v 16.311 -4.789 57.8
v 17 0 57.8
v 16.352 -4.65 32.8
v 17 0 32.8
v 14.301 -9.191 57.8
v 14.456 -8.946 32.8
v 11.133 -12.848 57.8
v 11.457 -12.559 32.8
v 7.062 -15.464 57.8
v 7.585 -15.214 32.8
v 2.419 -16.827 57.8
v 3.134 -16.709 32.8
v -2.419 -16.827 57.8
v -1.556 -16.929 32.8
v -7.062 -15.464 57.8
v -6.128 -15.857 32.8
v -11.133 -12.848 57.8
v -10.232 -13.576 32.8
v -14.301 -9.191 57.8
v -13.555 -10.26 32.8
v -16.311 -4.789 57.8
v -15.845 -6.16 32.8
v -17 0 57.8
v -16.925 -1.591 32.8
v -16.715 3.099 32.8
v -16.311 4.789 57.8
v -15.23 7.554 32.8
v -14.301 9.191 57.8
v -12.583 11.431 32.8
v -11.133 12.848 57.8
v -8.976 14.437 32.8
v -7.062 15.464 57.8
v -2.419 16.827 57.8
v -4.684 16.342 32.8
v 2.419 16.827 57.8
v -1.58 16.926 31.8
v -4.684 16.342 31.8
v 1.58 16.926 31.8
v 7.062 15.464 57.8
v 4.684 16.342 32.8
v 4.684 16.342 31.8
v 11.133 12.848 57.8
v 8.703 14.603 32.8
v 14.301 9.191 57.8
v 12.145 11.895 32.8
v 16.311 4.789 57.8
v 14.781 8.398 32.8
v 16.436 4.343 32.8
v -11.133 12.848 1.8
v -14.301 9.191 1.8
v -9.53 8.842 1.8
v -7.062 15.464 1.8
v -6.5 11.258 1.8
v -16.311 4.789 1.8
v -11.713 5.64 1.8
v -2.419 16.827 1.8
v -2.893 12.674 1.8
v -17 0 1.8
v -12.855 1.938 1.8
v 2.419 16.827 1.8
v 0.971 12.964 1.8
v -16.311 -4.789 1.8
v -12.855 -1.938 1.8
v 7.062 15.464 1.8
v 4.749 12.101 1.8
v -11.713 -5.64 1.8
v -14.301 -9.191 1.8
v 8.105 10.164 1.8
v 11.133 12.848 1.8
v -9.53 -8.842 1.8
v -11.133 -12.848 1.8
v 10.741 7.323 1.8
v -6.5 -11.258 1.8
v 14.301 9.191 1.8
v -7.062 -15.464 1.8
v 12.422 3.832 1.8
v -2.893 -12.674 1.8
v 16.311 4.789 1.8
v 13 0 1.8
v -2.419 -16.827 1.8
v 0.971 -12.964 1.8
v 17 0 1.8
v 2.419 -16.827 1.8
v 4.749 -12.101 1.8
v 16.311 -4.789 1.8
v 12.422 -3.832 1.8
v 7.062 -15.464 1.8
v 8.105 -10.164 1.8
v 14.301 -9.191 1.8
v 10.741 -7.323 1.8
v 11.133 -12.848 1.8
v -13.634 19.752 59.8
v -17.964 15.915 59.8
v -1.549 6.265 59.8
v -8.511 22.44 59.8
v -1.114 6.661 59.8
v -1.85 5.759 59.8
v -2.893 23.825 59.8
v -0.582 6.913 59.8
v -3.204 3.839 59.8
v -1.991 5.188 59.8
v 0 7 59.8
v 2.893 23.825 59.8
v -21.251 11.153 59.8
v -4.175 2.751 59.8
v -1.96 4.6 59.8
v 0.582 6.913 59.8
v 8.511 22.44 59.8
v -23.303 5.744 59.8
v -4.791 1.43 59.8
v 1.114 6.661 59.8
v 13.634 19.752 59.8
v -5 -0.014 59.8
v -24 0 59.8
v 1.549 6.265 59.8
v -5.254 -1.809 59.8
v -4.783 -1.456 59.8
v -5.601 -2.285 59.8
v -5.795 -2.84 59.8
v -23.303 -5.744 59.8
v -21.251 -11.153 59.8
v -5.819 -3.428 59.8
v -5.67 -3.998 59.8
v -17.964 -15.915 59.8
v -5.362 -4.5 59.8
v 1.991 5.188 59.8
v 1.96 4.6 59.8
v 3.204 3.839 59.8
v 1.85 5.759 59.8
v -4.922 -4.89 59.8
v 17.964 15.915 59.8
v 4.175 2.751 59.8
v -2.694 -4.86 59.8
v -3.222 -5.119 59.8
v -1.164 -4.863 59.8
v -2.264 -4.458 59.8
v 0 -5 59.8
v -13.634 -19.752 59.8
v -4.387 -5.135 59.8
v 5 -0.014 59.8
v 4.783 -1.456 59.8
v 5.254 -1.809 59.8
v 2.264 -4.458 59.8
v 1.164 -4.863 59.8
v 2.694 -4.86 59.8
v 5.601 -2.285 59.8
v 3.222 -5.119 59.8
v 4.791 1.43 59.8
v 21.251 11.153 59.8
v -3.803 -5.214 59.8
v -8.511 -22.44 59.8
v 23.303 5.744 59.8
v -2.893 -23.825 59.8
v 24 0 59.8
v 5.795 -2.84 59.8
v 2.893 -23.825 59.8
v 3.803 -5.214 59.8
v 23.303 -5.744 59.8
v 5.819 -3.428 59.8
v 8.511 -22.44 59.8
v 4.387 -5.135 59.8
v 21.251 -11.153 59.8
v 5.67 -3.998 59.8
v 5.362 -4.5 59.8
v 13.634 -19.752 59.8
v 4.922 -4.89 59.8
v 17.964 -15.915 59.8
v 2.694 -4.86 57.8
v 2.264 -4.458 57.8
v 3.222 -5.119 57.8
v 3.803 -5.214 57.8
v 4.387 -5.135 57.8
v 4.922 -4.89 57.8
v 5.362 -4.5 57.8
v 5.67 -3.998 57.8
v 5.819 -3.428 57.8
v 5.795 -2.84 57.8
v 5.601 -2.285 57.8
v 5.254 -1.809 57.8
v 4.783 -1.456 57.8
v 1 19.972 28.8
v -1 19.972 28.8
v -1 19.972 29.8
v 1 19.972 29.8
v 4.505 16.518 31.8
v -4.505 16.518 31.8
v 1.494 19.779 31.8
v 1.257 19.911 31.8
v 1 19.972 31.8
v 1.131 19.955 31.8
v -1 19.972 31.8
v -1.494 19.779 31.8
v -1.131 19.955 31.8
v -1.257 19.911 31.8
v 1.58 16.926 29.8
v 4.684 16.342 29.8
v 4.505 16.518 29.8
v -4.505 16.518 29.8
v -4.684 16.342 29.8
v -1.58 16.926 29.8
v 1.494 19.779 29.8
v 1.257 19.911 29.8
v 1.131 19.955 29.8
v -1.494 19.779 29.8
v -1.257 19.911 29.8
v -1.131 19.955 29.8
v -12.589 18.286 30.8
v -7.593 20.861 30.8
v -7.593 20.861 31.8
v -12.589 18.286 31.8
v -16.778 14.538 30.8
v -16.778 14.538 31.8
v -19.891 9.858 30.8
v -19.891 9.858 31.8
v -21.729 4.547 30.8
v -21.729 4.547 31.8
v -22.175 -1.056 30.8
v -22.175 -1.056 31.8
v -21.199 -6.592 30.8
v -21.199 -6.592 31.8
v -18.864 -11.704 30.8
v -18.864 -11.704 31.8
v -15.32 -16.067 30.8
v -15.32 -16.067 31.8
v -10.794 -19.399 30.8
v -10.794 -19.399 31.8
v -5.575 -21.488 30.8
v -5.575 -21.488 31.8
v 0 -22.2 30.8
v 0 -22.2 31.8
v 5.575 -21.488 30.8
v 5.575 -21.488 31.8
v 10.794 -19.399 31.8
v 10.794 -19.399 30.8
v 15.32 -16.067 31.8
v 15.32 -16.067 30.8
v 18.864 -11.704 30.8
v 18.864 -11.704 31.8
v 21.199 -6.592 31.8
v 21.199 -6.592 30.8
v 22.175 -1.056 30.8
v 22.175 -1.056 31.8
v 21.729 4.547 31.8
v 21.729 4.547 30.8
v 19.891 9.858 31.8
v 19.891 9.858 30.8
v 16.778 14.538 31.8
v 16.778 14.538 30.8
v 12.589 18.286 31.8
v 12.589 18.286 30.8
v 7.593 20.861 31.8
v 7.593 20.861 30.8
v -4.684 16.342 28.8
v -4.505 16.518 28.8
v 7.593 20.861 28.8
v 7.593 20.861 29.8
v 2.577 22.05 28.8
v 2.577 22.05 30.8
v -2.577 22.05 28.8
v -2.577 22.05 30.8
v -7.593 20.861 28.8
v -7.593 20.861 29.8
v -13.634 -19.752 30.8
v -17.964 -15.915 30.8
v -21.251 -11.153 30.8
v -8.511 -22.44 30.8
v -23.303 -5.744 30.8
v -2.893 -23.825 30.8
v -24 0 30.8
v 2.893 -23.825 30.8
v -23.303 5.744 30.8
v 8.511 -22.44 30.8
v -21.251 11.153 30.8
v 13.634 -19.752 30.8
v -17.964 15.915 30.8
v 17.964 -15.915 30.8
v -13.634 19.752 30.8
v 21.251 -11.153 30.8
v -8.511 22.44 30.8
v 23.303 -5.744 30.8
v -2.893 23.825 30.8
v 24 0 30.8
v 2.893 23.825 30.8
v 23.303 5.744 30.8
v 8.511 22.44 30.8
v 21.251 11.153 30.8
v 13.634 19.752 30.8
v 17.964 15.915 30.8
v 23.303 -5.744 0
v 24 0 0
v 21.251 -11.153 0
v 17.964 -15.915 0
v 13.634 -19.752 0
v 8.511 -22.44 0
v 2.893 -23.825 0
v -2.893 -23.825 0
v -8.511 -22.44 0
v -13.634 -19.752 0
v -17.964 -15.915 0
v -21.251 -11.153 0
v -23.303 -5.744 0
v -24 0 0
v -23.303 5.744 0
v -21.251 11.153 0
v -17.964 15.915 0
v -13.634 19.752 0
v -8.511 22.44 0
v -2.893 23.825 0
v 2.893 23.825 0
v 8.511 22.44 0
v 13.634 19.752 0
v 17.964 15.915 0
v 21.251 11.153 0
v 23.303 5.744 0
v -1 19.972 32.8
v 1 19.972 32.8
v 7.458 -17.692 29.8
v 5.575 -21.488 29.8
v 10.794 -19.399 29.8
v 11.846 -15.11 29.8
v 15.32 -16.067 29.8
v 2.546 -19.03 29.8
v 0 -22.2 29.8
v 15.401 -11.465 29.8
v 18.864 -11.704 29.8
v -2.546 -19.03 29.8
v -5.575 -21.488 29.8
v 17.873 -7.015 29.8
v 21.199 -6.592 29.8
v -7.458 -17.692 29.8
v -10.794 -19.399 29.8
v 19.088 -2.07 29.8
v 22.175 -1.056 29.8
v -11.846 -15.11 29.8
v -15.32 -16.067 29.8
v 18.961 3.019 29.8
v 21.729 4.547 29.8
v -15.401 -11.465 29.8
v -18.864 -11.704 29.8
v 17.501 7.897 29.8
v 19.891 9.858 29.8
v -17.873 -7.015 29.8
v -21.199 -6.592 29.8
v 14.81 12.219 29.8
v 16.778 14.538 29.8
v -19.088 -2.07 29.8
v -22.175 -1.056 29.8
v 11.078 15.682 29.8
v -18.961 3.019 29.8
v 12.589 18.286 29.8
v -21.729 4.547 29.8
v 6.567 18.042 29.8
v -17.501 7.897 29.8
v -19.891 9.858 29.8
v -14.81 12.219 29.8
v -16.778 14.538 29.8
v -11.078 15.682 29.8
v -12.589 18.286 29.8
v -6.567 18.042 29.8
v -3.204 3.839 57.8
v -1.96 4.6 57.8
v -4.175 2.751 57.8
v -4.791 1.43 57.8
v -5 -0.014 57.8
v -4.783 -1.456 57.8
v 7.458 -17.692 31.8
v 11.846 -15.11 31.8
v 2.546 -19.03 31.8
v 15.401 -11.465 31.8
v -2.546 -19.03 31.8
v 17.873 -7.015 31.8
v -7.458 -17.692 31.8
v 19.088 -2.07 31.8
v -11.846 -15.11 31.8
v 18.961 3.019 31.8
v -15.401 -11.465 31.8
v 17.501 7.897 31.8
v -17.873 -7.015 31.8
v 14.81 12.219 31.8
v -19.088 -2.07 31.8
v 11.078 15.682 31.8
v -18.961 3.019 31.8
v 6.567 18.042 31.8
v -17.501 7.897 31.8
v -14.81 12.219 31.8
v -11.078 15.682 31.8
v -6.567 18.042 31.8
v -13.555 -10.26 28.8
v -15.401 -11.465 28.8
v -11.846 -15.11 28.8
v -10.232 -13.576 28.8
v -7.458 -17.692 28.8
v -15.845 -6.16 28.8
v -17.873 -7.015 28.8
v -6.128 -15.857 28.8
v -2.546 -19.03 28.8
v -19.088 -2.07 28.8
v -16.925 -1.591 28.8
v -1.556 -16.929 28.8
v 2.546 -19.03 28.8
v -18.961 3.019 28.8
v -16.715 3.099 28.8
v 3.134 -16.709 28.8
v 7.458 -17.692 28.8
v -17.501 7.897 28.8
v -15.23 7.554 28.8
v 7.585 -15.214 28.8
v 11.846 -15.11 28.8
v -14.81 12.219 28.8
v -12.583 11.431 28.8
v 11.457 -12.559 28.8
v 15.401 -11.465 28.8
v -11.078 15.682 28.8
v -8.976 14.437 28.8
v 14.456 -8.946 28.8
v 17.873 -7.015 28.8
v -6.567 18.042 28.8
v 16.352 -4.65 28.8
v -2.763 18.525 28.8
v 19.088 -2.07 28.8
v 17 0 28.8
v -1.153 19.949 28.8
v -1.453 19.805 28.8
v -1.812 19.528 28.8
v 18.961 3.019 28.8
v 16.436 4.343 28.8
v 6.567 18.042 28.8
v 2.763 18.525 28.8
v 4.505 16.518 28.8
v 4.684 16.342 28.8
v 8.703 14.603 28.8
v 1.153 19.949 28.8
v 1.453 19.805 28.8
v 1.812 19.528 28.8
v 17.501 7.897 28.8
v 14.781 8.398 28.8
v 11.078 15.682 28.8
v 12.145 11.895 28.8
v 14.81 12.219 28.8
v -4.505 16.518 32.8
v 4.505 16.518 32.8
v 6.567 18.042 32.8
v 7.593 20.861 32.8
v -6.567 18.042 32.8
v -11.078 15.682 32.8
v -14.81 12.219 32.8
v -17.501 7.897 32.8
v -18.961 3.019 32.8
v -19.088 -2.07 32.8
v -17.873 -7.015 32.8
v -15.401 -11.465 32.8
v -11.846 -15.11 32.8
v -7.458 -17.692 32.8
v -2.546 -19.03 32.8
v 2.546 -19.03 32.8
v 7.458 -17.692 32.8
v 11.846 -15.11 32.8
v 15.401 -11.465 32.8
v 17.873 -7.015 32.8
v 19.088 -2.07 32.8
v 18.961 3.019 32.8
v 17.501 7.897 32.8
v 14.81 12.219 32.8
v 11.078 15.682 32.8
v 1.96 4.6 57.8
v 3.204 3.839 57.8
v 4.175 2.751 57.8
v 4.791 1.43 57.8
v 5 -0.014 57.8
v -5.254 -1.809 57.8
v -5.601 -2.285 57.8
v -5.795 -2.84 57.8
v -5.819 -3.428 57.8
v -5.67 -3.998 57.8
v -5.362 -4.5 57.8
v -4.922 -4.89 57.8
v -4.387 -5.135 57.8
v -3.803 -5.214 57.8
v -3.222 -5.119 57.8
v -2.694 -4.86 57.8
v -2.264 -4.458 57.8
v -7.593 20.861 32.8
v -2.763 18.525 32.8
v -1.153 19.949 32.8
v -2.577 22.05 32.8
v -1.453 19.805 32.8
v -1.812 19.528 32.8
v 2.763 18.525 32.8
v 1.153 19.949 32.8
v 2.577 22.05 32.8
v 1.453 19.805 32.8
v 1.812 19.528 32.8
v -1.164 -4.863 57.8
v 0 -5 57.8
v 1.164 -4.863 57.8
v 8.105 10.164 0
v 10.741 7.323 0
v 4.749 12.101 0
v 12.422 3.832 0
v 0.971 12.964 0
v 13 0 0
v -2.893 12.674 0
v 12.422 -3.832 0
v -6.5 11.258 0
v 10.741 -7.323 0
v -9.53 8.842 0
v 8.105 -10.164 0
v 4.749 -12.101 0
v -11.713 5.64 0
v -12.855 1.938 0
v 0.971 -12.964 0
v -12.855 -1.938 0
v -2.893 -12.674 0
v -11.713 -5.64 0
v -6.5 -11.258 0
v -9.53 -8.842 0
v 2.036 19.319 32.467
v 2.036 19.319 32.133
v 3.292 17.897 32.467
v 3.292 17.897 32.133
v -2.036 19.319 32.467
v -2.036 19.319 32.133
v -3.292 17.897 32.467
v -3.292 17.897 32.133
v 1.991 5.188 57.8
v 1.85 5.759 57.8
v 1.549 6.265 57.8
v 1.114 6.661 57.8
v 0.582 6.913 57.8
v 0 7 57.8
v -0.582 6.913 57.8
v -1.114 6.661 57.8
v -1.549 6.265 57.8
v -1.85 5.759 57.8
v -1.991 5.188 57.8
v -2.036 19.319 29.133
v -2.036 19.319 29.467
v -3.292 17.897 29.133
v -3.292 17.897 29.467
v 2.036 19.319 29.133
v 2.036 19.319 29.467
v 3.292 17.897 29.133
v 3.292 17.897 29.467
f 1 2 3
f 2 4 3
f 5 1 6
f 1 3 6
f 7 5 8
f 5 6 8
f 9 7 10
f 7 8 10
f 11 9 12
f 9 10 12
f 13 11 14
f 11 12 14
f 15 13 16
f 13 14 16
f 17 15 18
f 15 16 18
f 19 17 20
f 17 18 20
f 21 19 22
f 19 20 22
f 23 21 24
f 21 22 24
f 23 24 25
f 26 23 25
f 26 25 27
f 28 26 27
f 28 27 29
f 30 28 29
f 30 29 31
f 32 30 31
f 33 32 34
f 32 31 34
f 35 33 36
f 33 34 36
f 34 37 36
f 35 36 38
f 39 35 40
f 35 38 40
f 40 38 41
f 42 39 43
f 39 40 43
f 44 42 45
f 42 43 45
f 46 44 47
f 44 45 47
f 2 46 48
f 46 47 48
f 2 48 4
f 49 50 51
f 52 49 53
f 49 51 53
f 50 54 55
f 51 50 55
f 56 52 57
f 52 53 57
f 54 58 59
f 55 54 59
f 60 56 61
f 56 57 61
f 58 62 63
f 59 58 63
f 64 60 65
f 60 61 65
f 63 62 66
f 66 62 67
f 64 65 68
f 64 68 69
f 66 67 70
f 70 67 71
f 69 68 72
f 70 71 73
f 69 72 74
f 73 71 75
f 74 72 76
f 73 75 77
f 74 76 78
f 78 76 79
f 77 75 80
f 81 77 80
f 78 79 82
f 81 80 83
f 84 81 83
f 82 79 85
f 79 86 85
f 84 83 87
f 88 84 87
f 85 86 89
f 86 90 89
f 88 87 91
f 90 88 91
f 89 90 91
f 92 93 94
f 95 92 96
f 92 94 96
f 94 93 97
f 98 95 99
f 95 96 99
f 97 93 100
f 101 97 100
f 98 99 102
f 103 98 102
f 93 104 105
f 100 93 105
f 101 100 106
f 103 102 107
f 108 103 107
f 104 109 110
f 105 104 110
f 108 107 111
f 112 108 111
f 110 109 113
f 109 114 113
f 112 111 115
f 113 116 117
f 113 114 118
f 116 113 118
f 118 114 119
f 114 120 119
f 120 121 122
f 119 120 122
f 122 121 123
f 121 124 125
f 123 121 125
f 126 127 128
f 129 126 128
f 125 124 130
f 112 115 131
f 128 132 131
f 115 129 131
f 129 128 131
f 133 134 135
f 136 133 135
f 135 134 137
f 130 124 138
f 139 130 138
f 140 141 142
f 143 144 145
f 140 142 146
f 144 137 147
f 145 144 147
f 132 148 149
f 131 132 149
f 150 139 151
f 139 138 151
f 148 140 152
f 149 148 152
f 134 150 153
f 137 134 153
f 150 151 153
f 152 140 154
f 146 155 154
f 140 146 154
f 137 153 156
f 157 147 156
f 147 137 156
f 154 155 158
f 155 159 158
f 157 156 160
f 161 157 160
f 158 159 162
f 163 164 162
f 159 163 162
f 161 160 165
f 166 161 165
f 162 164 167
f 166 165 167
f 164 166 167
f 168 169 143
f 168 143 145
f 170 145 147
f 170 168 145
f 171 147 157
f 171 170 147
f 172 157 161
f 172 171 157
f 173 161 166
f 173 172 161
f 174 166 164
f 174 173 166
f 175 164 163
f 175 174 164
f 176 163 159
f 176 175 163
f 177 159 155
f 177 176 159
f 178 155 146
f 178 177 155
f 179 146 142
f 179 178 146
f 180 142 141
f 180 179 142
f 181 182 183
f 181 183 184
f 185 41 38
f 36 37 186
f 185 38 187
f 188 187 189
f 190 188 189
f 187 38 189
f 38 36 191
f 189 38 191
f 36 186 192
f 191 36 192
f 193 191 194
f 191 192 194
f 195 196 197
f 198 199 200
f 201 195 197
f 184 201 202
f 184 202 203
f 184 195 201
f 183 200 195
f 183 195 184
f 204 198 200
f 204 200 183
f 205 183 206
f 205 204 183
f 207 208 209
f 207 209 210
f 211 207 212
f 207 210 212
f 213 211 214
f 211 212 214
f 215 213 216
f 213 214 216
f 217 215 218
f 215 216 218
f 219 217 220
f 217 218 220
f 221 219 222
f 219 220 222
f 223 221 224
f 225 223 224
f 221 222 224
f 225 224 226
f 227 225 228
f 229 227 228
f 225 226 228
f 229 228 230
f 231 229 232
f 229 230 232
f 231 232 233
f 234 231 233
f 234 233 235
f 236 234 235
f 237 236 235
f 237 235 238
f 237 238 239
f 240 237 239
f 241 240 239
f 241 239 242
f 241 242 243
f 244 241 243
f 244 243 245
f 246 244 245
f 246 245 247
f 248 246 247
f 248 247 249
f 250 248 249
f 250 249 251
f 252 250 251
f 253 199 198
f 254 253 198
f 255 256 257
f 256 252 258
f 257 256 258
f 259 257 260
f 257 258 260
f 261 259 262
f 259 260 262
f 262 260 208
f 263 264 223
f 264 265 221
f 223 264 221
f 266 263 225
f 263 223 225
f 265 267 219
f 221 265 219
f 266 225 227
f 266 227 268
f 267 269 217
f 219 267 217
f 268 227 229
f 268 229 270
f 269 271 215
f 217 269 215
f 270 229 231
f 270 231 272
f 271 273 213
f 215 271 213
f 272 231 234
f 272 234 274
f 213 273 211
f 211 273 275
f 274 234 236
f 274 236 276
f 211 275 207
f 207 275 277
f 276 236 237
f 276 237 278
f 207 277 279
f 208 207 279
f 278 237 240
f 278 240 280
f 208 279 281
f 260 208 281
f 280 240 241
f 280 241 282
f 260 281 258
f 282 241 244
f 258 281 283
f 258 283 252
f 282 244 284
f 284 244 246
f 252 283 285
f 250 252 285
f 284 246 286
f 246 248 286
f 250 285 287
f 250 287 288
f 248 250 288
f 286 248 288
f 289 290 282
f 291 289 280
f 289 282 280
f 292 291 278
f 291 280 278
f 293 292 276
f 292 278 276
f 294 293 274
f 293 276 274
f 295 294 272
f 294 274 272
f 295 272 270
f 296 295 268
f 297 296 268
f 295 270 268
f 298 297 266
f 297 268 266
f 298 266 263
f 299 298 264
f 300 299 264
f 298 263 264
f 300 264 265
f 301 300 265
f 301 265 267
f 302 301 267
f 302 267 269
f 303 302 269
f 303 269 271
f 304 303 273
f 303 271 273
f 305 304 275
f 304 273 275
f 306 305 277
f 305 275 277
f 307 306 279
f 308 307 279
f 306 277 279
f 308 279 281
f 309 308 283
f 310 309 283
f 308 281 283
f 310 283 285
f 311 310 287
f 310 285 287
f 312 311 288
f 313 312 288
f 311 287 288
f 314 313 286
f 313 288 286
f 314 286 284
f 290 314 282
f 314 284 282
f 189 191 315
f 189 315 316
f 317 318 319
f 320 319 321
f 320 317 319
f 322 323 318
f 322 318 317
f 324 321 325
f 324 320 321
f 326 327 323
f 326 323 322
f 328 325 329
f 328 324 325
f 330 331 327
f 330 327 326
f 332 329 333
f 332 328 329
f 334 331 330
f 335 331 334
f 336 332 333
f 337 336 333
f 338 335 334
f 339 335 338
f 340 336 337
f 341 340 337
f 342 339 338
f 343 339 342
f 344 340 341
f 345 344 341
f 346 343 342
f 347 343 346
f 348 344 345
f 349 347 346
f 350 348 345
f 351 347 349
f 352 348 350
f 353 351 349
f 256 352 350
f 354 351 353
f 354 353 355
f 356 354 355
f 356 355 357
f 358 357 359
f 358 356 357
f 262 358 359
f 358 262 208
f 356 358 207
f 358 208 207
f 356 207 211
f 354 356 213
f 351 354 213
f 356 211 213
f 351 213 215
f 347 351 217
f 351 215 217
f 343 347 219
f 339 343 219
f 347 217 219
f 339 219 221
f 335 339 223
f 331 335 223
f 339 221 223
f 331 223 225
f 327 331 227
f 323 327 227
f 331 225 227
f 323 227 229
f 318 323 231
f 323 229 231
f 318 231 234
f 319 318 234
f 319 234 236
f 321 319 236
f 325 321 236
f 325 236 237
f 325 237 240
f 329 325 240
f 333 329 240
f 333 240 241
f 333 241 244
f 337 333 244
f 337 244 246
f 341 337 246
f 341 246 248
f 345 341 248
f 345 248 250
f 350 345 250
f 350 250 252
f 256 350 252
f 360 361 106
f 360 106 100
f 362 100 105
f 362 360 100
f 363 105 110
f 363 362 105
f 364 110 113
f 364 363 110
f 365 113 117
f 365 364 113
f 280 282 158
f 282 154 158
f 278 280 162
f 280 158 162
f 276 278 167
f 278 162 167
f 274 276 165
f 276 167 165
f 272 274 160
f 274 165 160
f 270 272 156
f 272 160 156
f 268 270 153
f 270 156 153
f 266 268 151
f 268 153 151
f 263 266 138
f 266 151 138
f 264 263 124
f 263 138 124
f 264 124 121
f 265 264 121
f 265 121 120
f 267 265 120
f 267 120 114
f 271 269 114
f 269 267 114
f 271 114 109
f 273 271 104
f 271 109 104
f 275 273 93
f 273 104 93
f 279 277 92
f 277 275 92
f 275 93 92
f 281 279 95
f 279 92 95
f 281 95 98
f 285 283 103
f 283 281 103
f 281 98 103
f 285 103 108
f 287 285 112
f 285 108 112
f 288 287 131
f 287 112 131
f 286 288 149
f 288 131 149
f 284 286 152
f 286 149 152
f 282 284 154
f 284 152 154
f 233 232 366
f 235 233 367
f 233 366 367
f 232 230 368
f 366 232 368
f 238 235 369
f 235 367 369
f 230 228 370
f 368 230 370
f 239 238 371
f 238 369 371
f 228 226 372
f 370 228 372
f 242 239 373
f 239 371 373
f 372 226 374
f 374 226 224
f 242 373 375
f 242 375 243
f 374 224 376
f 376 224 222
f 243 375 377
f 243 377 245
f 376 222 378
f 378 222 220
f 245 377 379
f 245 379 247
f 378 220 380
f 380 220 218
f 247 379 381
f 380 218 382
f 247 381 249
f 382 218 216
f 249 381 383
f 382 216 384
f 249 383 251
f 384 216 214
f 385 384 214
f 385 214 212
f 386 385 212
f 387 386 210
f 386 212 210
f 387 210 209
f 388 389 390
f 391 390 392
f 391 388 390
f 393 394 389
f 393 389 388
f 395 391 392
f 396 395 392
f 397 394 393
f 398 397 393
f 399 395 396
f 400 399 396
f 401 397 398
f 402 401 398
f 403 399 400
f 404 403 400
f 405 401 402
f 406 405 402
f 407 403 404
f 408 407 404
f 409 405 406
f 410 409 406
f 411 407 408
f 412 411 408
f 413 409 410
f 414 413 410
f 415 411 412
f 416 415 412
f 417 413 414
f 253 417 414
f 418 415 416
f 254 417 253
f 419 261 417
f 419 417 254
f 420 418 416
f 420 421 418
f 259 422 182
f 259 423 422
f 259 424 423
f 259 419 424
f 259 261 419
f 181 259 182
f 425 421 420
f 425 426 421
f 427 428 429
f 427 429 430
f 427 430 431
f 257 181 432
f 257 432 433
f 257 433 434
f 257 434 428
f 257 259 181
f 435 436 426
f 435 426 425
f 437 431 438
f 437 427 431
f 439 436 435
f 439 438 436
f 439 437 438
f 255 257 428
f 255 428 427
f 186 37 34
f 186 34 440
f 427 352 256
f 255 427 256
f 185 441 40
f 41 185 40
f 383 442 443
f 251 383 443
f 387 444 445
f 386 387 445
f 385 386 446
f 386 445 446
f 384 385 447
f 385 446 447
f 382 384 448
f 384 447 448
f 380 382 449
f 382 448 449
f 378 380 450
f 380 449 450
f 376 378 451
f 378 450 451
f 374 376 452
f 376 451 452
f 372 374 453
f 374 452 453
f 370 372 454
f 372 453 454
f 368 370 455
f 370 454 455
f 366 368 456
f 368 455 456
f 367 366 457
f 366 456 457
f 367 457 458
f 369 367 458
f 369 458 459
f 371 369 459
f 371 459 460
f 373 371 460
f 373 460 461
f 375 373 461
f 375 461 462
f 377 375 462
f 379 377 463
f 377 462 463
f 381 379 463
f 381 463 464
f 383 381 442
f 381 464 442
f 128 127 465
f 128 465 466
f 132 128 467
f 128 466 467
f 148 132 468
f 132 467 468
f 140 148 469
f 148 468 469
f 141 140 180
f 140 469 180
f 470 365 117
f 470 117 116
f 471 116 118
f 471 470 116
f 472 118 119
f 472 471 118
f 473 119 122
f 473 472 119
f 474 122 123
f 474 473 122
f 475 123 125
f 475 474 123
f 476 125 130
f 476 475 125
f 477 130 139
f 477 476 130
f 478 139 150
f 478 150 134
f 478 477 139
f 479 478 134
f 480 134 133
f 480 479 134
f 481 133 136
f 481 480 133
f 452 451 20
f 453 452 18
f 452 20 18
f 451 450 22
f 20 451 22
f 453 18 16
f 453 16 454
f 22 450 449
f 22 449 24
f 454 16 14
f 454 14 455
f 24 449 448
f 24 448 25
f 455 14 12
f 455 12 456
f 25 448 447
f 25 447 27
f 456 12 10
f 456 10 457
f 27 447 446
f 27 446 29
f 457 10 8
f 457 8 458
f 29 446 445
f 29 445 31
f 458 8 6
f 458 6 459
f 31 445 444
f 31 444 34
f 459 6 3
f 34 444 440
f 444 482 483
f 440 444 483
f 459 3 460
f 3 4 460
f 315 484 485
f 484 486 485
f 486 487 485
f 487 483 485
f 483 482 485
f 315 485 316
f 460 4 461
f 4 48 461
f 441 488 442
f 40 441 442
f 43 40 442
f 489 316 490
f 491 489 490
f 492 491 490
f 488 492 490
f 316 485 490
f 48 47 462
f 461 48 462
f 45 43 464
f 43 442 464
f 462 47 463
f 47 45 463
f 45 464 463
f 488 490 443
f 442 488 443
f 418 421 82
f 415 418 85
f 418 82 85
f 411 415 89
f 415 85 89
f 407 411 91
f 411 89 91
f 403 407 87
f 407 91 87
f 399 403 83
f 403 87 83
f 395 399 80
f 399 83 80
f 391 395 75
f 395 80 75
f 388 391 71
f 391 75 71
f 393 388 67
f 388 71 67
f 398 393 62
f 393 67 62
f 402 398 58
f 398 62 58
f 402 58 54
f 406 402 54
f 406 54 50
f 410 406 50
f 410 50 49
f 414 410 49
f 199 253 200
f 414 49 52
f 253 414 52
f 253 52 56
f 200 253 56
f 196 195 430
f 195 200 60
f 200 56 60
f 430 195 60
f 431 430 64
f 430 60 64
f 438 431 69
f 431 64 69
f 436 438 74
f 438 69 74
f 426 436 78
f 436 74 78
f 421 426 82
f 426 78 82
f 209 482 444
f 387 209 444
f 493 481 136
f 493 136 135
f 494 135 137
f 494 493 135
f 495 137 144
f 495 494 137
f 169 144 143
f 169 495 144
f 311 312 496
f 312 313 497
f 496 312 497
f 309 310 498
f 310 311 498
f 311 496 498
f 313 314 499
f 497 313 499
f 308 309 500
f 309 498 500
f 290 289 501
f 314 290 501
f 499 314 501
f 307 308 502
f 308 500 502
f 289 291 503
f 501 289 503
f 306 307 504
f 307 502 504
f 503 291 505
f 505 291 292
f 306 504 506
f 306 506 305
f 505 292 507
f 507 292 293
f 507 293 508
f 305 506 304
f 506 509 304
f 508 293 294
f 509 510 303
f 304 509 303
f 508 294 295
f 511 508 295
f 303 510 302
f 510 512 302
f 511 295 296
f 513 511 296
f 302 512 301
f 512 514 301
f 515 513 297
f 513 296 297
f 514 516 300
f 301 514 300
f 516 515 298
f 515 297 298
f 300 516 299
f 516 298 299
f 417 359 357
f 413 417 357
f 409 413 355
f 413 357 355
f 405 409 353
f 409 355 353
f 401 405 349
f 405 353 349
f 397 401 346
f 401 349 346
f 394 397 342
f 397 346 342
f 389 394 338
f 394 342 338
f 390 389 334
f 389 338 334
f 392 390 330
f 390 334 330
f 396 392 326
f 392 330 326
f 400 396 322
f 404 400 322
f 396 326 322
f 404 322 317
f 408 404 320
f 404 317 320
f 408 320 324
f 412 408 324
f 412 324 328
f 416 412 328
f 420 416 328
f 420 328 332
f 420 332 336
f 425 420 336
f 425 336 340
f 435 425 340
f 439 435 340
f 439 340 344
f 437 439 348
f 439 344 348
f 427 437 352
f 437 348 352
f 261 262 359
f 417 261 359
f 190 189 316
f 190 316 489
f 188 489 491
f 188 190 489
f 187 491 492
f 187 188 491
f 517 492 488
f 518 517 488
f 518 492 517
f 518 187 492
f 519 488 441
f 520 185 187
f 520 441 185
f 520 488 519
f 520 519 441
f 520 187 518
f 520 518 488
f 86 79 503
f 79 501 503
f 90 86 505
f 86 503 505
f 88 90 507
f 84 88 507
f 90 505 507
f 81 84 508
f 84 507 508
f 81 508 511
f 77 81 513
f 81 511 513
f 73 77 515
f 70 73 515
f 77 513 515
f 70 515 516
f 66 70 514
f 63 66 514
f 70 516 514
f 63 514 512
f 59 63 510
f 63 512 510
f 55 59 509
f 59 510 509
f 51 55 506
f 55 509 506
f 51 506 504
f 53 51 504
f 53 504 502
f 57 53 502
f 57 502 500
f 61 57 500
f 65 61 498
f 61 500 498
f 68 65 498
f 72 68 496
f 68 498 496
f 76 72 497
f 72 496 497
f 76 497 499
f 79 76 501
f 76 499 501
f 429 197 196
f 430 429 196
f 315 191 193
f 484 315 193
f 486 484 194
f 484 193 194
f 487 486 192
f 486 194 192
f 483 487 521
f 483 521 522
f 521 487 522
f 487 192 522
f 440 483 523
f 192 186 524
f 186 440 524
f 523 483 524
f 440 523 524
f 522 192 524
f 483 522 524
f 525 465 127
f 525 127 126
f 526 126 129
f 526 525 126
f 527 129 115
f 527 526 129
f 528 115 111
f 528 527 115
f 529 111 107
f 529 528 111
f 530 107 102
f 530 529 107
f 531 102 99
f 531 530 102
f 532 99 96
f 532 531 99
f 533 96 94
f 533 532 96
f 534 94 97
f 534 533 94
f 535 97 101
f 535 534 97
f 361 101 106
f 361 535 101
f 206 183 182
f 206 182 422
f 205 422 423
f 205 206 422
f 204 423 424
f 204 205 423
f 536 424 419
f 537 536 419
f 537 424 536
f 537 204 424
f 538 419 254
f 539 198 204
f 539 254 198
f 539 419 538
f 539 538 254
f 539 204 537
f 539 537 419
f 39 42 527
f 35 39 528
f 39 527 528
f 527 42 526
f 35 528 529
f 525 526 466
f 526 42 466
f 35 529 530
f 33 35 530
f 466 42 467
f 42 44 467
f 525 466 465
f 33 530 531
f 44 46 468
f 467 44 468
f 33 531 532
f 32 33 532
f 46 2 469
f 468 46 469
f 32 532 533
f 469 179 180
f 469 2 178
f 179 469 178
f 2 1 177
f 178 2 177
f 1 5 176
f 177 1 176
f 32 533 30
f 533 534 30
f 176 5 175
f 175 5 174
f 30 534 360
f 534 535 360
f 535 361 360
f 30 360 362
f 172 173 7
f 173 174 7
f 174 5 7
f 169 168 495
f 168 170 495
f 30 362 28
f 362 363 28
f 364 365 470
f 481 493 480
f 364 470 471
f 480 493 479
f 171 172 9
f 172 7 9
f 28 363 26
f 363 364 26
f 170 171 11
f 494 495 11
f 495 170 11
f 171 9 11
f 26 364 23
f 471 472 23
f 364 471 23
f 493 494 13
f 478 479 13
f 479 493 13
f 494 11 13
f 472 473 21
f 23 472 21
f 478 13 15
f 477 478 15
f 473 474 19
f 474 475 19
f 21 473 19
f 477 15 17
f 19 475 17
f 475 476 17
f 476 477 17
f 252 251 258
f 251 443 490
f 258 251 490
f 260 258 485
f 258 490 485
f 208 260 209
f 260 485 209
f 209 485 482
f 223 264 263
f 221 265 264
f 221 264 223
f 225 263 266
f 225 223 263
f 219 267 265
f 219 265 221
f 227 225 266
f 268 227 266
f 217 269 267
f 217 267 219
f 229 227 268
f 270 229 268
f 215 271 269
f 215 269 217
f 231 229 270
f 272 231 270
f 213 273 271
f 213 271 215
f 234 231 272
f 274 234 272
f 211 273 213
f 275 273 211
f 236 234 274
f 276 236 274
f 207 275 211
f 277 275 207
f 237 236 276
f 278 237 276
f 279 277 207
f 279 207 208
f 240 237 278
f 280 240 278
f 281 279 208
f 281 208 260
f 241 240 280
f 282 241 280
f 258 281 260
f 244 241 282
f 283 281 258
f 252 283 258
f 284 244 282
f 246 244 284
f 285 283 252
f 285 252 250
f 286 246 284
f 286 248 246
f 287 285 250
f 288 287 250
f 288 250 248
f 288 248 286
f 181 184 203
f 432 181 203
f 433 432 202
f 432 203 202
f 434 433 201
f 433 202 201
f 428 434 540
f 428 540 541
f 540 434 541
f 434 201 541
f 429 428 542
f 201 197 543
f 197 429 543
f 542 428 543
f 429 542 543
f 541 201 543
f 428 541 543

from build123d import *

# Parameters (mm, degrees)
CUT_EXTRUDE1_DEPTH = 2
CUT_EXTRUDE2_DEPTH = 1
CUT_EXTRUDE3_REACH = 70.761


with BuildPart() as part:
    # Sketch1 → Revolve1 (revolve)
    with BuildSketch(Plane(origin=(0, 0, 0), x_dir=(0, 0, -1), z_dir=(1, 0, 0))):
        Polygon((-59.8, 5), (-57.8, 5), (-57.8, 17), (-1.8, 17), (-1.8, 13), (0, 13), (0, 24), (-59.8, 24), align=None)
    revolve(axis=Axis((0, 0, 1072.381477522), (0, 0, -1)))

    # Sketch3 → Cut-Extrude1 (cut, symmetric)
    with BuildSketch(Plane.XY.offset(30.8)):
        with BuildLine():
            ThreePointArc((-6.566786752, 18.042098319), (0, -19.2), (6.566786752, 18.042098319))
            Line((6.566786752, 18.042098319), (7.592847182, 20.861176181))
            ThreePointArc((7.592847182, 20.861176181), (0, 22.2), (-7.592847182, 20.861176181))
            Line((-7.592847182, 20.861176181), (-6.566786752, 18.042098319))
        make_face()
        with BuildLine():
            add(Edge.make_bspline(
                [(-1, 19.972224976), (-1.837517439, 19.972224976), (-3.400688885, 17.606551444), (-4.505268868, 16.51808236)],
                knots=[0, 0, 0, 0, 1, 1, 1, 1], degree=3))
            Line((-1, 19.972224976), (1, 19.972224976))
            add(Edge.make_bspline(
                [(1, 19.972224976), (1.837517439, 19.972224976), (3.400688885, 17.606551444), (4.505268868, 16.51808236)],
                knots=[0, 0, 0, 0, 1, 1, 1, 1], degree=3))
            Line((4.505268868, 16.51808236), (4.683975969, 16.341981799))
            ThreePointArc((4.683975969, 16.341981799), (13.576221703, 10.231627645), (17, 0))
            ThreePointArc((17, 0), (-10.231627645, -13.576221703), (-4.683975969, 16.341981799))
            Line((-4.683975969, 16.341981799), (-4.505268868, 16.51808236))
        make_face(mode=Mode.SUBTRACT)
    extrude(amount=CUT_EXTRUDE1_DEPTH, both=True, mode=Mode.SUBTRACT)

    # Sketch3<5> → Cut-Extrude2 (cut, symmetric)
    with BuildSketch(Plane.XY.offset(30.8)):
        with BuildLine():
            Line((1, 19.972224976), (-1, 19.972224976))
            add(Edge.make_bspline(
                [(-1, 19.972224976), (-1.837517439, 19.972224976), (-3.400688885, 17.606551444), (-4.505268868, 16.51808236)],
                knots=[0, 0, 0, 0, 1, 1, 1, 1], degree=3))
            Line((-4.505268868, 16.51808236), (-4.683975969, 16.341981799))
            ThreePointArc((-4.683975969, 16.341981799), (0, -17), (4.683975969, 16.341981799))
            Line((4.683975969, 16.341981799), (4.505268868, 16.51808236))
            add(Edge.make_bspline(
                [(1, 19.972224976), (1.837517439, 19.972224976), (3.400688885, 17.606551444), (4.505268868, 16.51808236)],
                knots=[0, 0, 0, 0, 1, 1, 1, 1], degree=3))
        make_face()
        with BuildLine():
            Line((7.592847182, 20.861176181), (6.566786752, 18.042098319))
            ThreePointArc((6.566786752, 18.042098319), (0, -19.2), (-6.566786752, 18.042098319))
            Line((-6.566786752, 18.042098319), (-7.592847182, 20.861176181))
            ThreePointArc((-7.592847182, 20.861176181), (0, -22.2), (7.592847182, 20.861176181))
        make_face()
    extrude(amount=CUT_EXTRUDE2_DEPTH, both=True, mode=Mode.SUBTRACT)

    # Sketch5 → Cut-Extrude3 (cut, up to next)
    with BuildSketch(Plane.XY.offset(59.8), mode=Mode.PRIVATE) as cut_extrude3_sk1:
        with BuildLine():
            ThreePointArc((1.959591794, 4.6), (0, 7), (-1.959591794, 4.6))
            ThreePointArc((-1.959591794, 4.6), (0, 5), (1.959591794, 4.6))
        make_face()
    cut_extrude3_tool1 = extrude(cut_extrude3_sk1.sketch, amount=-CUT_EXTRUDE3_REACH, mode=Mode.PRIVATE) & part.part
    # Sketch5 → Cut-Extrude3 (cut, up to next)
    with BuildSketch(Plane.XY.offset(59.8), mode=Mode.PRIVATE) as cut_extrude3_sk2:
        with BuildLine():
            ThreePointArc((-2.264203113, -4.457957409), (-3.830222216, -3.213938048), (-4.783405764, -1.4556886))
            ThreePointArc((-4.783405764, -1.4556886), (-5.362311102, -4.499513268), (-2.264203113, -4.457957409))
        make_face()
    cut_extrude3_tool2 = extrude(cut_extrude3_sk2.sketch, amount=-CUT_EXTRUDE3_REACH, mode=Mode.PRIVATE) & part.part
    # Sketch5 → Cut-Extrude3 (cut, up to next)
    with BuildSketch(Plane.XY.offset(59.8), mode=Mode.PRIVATE) as cut_extrude3_sk3:
        with BuildLine():
            ThreePointArc((2.264203113, -4.457957409), (5.362311102, -4.499513268), (4.783405764, -1.4556886))
            ThreePointArc((4.783405764, -1.4556886), (3.830222216, -3.213938048), (2.264203113, -4.457957409))
        make_face()
    cut_extrude3_tool3 = extrude(cut_extrude3_sk3.sketch, amount=-CUT_EXTRUDE3_REACH, mode=Mode.PRIVATE) & part.part
    add(cut_extrude3_tool1.solids().sort_by_distance((0, 5.772711, 59.8))[0], mode=Mode.SUBTRACT)
    add(cut_extrude3_tool2.solids().sort_by_distance((-4.422153, -3.710627, 59.8))[0], mode=Mode.SUBTRACT)
    add(cut_extrude3_tool3.solids().sort_by_distance((4.422153, -3.710627, 59.8))[0], mode=Mode.SUBTRACT)


with BuildPart() as body_2:
    # Split4: the piece on the far side of the plane
    add(part.part)
    split(bisect_by=Plane.XY.offset(30.8), keep=Keep.BOTTOM)


with BuildPart() as part_1:
    add(part.part)

    # Split4
    split(bisect_by=Plane.XY.offset(30.8), keep=Keep.TOP)


solid = Compound([body_2.part, part_1.part])
